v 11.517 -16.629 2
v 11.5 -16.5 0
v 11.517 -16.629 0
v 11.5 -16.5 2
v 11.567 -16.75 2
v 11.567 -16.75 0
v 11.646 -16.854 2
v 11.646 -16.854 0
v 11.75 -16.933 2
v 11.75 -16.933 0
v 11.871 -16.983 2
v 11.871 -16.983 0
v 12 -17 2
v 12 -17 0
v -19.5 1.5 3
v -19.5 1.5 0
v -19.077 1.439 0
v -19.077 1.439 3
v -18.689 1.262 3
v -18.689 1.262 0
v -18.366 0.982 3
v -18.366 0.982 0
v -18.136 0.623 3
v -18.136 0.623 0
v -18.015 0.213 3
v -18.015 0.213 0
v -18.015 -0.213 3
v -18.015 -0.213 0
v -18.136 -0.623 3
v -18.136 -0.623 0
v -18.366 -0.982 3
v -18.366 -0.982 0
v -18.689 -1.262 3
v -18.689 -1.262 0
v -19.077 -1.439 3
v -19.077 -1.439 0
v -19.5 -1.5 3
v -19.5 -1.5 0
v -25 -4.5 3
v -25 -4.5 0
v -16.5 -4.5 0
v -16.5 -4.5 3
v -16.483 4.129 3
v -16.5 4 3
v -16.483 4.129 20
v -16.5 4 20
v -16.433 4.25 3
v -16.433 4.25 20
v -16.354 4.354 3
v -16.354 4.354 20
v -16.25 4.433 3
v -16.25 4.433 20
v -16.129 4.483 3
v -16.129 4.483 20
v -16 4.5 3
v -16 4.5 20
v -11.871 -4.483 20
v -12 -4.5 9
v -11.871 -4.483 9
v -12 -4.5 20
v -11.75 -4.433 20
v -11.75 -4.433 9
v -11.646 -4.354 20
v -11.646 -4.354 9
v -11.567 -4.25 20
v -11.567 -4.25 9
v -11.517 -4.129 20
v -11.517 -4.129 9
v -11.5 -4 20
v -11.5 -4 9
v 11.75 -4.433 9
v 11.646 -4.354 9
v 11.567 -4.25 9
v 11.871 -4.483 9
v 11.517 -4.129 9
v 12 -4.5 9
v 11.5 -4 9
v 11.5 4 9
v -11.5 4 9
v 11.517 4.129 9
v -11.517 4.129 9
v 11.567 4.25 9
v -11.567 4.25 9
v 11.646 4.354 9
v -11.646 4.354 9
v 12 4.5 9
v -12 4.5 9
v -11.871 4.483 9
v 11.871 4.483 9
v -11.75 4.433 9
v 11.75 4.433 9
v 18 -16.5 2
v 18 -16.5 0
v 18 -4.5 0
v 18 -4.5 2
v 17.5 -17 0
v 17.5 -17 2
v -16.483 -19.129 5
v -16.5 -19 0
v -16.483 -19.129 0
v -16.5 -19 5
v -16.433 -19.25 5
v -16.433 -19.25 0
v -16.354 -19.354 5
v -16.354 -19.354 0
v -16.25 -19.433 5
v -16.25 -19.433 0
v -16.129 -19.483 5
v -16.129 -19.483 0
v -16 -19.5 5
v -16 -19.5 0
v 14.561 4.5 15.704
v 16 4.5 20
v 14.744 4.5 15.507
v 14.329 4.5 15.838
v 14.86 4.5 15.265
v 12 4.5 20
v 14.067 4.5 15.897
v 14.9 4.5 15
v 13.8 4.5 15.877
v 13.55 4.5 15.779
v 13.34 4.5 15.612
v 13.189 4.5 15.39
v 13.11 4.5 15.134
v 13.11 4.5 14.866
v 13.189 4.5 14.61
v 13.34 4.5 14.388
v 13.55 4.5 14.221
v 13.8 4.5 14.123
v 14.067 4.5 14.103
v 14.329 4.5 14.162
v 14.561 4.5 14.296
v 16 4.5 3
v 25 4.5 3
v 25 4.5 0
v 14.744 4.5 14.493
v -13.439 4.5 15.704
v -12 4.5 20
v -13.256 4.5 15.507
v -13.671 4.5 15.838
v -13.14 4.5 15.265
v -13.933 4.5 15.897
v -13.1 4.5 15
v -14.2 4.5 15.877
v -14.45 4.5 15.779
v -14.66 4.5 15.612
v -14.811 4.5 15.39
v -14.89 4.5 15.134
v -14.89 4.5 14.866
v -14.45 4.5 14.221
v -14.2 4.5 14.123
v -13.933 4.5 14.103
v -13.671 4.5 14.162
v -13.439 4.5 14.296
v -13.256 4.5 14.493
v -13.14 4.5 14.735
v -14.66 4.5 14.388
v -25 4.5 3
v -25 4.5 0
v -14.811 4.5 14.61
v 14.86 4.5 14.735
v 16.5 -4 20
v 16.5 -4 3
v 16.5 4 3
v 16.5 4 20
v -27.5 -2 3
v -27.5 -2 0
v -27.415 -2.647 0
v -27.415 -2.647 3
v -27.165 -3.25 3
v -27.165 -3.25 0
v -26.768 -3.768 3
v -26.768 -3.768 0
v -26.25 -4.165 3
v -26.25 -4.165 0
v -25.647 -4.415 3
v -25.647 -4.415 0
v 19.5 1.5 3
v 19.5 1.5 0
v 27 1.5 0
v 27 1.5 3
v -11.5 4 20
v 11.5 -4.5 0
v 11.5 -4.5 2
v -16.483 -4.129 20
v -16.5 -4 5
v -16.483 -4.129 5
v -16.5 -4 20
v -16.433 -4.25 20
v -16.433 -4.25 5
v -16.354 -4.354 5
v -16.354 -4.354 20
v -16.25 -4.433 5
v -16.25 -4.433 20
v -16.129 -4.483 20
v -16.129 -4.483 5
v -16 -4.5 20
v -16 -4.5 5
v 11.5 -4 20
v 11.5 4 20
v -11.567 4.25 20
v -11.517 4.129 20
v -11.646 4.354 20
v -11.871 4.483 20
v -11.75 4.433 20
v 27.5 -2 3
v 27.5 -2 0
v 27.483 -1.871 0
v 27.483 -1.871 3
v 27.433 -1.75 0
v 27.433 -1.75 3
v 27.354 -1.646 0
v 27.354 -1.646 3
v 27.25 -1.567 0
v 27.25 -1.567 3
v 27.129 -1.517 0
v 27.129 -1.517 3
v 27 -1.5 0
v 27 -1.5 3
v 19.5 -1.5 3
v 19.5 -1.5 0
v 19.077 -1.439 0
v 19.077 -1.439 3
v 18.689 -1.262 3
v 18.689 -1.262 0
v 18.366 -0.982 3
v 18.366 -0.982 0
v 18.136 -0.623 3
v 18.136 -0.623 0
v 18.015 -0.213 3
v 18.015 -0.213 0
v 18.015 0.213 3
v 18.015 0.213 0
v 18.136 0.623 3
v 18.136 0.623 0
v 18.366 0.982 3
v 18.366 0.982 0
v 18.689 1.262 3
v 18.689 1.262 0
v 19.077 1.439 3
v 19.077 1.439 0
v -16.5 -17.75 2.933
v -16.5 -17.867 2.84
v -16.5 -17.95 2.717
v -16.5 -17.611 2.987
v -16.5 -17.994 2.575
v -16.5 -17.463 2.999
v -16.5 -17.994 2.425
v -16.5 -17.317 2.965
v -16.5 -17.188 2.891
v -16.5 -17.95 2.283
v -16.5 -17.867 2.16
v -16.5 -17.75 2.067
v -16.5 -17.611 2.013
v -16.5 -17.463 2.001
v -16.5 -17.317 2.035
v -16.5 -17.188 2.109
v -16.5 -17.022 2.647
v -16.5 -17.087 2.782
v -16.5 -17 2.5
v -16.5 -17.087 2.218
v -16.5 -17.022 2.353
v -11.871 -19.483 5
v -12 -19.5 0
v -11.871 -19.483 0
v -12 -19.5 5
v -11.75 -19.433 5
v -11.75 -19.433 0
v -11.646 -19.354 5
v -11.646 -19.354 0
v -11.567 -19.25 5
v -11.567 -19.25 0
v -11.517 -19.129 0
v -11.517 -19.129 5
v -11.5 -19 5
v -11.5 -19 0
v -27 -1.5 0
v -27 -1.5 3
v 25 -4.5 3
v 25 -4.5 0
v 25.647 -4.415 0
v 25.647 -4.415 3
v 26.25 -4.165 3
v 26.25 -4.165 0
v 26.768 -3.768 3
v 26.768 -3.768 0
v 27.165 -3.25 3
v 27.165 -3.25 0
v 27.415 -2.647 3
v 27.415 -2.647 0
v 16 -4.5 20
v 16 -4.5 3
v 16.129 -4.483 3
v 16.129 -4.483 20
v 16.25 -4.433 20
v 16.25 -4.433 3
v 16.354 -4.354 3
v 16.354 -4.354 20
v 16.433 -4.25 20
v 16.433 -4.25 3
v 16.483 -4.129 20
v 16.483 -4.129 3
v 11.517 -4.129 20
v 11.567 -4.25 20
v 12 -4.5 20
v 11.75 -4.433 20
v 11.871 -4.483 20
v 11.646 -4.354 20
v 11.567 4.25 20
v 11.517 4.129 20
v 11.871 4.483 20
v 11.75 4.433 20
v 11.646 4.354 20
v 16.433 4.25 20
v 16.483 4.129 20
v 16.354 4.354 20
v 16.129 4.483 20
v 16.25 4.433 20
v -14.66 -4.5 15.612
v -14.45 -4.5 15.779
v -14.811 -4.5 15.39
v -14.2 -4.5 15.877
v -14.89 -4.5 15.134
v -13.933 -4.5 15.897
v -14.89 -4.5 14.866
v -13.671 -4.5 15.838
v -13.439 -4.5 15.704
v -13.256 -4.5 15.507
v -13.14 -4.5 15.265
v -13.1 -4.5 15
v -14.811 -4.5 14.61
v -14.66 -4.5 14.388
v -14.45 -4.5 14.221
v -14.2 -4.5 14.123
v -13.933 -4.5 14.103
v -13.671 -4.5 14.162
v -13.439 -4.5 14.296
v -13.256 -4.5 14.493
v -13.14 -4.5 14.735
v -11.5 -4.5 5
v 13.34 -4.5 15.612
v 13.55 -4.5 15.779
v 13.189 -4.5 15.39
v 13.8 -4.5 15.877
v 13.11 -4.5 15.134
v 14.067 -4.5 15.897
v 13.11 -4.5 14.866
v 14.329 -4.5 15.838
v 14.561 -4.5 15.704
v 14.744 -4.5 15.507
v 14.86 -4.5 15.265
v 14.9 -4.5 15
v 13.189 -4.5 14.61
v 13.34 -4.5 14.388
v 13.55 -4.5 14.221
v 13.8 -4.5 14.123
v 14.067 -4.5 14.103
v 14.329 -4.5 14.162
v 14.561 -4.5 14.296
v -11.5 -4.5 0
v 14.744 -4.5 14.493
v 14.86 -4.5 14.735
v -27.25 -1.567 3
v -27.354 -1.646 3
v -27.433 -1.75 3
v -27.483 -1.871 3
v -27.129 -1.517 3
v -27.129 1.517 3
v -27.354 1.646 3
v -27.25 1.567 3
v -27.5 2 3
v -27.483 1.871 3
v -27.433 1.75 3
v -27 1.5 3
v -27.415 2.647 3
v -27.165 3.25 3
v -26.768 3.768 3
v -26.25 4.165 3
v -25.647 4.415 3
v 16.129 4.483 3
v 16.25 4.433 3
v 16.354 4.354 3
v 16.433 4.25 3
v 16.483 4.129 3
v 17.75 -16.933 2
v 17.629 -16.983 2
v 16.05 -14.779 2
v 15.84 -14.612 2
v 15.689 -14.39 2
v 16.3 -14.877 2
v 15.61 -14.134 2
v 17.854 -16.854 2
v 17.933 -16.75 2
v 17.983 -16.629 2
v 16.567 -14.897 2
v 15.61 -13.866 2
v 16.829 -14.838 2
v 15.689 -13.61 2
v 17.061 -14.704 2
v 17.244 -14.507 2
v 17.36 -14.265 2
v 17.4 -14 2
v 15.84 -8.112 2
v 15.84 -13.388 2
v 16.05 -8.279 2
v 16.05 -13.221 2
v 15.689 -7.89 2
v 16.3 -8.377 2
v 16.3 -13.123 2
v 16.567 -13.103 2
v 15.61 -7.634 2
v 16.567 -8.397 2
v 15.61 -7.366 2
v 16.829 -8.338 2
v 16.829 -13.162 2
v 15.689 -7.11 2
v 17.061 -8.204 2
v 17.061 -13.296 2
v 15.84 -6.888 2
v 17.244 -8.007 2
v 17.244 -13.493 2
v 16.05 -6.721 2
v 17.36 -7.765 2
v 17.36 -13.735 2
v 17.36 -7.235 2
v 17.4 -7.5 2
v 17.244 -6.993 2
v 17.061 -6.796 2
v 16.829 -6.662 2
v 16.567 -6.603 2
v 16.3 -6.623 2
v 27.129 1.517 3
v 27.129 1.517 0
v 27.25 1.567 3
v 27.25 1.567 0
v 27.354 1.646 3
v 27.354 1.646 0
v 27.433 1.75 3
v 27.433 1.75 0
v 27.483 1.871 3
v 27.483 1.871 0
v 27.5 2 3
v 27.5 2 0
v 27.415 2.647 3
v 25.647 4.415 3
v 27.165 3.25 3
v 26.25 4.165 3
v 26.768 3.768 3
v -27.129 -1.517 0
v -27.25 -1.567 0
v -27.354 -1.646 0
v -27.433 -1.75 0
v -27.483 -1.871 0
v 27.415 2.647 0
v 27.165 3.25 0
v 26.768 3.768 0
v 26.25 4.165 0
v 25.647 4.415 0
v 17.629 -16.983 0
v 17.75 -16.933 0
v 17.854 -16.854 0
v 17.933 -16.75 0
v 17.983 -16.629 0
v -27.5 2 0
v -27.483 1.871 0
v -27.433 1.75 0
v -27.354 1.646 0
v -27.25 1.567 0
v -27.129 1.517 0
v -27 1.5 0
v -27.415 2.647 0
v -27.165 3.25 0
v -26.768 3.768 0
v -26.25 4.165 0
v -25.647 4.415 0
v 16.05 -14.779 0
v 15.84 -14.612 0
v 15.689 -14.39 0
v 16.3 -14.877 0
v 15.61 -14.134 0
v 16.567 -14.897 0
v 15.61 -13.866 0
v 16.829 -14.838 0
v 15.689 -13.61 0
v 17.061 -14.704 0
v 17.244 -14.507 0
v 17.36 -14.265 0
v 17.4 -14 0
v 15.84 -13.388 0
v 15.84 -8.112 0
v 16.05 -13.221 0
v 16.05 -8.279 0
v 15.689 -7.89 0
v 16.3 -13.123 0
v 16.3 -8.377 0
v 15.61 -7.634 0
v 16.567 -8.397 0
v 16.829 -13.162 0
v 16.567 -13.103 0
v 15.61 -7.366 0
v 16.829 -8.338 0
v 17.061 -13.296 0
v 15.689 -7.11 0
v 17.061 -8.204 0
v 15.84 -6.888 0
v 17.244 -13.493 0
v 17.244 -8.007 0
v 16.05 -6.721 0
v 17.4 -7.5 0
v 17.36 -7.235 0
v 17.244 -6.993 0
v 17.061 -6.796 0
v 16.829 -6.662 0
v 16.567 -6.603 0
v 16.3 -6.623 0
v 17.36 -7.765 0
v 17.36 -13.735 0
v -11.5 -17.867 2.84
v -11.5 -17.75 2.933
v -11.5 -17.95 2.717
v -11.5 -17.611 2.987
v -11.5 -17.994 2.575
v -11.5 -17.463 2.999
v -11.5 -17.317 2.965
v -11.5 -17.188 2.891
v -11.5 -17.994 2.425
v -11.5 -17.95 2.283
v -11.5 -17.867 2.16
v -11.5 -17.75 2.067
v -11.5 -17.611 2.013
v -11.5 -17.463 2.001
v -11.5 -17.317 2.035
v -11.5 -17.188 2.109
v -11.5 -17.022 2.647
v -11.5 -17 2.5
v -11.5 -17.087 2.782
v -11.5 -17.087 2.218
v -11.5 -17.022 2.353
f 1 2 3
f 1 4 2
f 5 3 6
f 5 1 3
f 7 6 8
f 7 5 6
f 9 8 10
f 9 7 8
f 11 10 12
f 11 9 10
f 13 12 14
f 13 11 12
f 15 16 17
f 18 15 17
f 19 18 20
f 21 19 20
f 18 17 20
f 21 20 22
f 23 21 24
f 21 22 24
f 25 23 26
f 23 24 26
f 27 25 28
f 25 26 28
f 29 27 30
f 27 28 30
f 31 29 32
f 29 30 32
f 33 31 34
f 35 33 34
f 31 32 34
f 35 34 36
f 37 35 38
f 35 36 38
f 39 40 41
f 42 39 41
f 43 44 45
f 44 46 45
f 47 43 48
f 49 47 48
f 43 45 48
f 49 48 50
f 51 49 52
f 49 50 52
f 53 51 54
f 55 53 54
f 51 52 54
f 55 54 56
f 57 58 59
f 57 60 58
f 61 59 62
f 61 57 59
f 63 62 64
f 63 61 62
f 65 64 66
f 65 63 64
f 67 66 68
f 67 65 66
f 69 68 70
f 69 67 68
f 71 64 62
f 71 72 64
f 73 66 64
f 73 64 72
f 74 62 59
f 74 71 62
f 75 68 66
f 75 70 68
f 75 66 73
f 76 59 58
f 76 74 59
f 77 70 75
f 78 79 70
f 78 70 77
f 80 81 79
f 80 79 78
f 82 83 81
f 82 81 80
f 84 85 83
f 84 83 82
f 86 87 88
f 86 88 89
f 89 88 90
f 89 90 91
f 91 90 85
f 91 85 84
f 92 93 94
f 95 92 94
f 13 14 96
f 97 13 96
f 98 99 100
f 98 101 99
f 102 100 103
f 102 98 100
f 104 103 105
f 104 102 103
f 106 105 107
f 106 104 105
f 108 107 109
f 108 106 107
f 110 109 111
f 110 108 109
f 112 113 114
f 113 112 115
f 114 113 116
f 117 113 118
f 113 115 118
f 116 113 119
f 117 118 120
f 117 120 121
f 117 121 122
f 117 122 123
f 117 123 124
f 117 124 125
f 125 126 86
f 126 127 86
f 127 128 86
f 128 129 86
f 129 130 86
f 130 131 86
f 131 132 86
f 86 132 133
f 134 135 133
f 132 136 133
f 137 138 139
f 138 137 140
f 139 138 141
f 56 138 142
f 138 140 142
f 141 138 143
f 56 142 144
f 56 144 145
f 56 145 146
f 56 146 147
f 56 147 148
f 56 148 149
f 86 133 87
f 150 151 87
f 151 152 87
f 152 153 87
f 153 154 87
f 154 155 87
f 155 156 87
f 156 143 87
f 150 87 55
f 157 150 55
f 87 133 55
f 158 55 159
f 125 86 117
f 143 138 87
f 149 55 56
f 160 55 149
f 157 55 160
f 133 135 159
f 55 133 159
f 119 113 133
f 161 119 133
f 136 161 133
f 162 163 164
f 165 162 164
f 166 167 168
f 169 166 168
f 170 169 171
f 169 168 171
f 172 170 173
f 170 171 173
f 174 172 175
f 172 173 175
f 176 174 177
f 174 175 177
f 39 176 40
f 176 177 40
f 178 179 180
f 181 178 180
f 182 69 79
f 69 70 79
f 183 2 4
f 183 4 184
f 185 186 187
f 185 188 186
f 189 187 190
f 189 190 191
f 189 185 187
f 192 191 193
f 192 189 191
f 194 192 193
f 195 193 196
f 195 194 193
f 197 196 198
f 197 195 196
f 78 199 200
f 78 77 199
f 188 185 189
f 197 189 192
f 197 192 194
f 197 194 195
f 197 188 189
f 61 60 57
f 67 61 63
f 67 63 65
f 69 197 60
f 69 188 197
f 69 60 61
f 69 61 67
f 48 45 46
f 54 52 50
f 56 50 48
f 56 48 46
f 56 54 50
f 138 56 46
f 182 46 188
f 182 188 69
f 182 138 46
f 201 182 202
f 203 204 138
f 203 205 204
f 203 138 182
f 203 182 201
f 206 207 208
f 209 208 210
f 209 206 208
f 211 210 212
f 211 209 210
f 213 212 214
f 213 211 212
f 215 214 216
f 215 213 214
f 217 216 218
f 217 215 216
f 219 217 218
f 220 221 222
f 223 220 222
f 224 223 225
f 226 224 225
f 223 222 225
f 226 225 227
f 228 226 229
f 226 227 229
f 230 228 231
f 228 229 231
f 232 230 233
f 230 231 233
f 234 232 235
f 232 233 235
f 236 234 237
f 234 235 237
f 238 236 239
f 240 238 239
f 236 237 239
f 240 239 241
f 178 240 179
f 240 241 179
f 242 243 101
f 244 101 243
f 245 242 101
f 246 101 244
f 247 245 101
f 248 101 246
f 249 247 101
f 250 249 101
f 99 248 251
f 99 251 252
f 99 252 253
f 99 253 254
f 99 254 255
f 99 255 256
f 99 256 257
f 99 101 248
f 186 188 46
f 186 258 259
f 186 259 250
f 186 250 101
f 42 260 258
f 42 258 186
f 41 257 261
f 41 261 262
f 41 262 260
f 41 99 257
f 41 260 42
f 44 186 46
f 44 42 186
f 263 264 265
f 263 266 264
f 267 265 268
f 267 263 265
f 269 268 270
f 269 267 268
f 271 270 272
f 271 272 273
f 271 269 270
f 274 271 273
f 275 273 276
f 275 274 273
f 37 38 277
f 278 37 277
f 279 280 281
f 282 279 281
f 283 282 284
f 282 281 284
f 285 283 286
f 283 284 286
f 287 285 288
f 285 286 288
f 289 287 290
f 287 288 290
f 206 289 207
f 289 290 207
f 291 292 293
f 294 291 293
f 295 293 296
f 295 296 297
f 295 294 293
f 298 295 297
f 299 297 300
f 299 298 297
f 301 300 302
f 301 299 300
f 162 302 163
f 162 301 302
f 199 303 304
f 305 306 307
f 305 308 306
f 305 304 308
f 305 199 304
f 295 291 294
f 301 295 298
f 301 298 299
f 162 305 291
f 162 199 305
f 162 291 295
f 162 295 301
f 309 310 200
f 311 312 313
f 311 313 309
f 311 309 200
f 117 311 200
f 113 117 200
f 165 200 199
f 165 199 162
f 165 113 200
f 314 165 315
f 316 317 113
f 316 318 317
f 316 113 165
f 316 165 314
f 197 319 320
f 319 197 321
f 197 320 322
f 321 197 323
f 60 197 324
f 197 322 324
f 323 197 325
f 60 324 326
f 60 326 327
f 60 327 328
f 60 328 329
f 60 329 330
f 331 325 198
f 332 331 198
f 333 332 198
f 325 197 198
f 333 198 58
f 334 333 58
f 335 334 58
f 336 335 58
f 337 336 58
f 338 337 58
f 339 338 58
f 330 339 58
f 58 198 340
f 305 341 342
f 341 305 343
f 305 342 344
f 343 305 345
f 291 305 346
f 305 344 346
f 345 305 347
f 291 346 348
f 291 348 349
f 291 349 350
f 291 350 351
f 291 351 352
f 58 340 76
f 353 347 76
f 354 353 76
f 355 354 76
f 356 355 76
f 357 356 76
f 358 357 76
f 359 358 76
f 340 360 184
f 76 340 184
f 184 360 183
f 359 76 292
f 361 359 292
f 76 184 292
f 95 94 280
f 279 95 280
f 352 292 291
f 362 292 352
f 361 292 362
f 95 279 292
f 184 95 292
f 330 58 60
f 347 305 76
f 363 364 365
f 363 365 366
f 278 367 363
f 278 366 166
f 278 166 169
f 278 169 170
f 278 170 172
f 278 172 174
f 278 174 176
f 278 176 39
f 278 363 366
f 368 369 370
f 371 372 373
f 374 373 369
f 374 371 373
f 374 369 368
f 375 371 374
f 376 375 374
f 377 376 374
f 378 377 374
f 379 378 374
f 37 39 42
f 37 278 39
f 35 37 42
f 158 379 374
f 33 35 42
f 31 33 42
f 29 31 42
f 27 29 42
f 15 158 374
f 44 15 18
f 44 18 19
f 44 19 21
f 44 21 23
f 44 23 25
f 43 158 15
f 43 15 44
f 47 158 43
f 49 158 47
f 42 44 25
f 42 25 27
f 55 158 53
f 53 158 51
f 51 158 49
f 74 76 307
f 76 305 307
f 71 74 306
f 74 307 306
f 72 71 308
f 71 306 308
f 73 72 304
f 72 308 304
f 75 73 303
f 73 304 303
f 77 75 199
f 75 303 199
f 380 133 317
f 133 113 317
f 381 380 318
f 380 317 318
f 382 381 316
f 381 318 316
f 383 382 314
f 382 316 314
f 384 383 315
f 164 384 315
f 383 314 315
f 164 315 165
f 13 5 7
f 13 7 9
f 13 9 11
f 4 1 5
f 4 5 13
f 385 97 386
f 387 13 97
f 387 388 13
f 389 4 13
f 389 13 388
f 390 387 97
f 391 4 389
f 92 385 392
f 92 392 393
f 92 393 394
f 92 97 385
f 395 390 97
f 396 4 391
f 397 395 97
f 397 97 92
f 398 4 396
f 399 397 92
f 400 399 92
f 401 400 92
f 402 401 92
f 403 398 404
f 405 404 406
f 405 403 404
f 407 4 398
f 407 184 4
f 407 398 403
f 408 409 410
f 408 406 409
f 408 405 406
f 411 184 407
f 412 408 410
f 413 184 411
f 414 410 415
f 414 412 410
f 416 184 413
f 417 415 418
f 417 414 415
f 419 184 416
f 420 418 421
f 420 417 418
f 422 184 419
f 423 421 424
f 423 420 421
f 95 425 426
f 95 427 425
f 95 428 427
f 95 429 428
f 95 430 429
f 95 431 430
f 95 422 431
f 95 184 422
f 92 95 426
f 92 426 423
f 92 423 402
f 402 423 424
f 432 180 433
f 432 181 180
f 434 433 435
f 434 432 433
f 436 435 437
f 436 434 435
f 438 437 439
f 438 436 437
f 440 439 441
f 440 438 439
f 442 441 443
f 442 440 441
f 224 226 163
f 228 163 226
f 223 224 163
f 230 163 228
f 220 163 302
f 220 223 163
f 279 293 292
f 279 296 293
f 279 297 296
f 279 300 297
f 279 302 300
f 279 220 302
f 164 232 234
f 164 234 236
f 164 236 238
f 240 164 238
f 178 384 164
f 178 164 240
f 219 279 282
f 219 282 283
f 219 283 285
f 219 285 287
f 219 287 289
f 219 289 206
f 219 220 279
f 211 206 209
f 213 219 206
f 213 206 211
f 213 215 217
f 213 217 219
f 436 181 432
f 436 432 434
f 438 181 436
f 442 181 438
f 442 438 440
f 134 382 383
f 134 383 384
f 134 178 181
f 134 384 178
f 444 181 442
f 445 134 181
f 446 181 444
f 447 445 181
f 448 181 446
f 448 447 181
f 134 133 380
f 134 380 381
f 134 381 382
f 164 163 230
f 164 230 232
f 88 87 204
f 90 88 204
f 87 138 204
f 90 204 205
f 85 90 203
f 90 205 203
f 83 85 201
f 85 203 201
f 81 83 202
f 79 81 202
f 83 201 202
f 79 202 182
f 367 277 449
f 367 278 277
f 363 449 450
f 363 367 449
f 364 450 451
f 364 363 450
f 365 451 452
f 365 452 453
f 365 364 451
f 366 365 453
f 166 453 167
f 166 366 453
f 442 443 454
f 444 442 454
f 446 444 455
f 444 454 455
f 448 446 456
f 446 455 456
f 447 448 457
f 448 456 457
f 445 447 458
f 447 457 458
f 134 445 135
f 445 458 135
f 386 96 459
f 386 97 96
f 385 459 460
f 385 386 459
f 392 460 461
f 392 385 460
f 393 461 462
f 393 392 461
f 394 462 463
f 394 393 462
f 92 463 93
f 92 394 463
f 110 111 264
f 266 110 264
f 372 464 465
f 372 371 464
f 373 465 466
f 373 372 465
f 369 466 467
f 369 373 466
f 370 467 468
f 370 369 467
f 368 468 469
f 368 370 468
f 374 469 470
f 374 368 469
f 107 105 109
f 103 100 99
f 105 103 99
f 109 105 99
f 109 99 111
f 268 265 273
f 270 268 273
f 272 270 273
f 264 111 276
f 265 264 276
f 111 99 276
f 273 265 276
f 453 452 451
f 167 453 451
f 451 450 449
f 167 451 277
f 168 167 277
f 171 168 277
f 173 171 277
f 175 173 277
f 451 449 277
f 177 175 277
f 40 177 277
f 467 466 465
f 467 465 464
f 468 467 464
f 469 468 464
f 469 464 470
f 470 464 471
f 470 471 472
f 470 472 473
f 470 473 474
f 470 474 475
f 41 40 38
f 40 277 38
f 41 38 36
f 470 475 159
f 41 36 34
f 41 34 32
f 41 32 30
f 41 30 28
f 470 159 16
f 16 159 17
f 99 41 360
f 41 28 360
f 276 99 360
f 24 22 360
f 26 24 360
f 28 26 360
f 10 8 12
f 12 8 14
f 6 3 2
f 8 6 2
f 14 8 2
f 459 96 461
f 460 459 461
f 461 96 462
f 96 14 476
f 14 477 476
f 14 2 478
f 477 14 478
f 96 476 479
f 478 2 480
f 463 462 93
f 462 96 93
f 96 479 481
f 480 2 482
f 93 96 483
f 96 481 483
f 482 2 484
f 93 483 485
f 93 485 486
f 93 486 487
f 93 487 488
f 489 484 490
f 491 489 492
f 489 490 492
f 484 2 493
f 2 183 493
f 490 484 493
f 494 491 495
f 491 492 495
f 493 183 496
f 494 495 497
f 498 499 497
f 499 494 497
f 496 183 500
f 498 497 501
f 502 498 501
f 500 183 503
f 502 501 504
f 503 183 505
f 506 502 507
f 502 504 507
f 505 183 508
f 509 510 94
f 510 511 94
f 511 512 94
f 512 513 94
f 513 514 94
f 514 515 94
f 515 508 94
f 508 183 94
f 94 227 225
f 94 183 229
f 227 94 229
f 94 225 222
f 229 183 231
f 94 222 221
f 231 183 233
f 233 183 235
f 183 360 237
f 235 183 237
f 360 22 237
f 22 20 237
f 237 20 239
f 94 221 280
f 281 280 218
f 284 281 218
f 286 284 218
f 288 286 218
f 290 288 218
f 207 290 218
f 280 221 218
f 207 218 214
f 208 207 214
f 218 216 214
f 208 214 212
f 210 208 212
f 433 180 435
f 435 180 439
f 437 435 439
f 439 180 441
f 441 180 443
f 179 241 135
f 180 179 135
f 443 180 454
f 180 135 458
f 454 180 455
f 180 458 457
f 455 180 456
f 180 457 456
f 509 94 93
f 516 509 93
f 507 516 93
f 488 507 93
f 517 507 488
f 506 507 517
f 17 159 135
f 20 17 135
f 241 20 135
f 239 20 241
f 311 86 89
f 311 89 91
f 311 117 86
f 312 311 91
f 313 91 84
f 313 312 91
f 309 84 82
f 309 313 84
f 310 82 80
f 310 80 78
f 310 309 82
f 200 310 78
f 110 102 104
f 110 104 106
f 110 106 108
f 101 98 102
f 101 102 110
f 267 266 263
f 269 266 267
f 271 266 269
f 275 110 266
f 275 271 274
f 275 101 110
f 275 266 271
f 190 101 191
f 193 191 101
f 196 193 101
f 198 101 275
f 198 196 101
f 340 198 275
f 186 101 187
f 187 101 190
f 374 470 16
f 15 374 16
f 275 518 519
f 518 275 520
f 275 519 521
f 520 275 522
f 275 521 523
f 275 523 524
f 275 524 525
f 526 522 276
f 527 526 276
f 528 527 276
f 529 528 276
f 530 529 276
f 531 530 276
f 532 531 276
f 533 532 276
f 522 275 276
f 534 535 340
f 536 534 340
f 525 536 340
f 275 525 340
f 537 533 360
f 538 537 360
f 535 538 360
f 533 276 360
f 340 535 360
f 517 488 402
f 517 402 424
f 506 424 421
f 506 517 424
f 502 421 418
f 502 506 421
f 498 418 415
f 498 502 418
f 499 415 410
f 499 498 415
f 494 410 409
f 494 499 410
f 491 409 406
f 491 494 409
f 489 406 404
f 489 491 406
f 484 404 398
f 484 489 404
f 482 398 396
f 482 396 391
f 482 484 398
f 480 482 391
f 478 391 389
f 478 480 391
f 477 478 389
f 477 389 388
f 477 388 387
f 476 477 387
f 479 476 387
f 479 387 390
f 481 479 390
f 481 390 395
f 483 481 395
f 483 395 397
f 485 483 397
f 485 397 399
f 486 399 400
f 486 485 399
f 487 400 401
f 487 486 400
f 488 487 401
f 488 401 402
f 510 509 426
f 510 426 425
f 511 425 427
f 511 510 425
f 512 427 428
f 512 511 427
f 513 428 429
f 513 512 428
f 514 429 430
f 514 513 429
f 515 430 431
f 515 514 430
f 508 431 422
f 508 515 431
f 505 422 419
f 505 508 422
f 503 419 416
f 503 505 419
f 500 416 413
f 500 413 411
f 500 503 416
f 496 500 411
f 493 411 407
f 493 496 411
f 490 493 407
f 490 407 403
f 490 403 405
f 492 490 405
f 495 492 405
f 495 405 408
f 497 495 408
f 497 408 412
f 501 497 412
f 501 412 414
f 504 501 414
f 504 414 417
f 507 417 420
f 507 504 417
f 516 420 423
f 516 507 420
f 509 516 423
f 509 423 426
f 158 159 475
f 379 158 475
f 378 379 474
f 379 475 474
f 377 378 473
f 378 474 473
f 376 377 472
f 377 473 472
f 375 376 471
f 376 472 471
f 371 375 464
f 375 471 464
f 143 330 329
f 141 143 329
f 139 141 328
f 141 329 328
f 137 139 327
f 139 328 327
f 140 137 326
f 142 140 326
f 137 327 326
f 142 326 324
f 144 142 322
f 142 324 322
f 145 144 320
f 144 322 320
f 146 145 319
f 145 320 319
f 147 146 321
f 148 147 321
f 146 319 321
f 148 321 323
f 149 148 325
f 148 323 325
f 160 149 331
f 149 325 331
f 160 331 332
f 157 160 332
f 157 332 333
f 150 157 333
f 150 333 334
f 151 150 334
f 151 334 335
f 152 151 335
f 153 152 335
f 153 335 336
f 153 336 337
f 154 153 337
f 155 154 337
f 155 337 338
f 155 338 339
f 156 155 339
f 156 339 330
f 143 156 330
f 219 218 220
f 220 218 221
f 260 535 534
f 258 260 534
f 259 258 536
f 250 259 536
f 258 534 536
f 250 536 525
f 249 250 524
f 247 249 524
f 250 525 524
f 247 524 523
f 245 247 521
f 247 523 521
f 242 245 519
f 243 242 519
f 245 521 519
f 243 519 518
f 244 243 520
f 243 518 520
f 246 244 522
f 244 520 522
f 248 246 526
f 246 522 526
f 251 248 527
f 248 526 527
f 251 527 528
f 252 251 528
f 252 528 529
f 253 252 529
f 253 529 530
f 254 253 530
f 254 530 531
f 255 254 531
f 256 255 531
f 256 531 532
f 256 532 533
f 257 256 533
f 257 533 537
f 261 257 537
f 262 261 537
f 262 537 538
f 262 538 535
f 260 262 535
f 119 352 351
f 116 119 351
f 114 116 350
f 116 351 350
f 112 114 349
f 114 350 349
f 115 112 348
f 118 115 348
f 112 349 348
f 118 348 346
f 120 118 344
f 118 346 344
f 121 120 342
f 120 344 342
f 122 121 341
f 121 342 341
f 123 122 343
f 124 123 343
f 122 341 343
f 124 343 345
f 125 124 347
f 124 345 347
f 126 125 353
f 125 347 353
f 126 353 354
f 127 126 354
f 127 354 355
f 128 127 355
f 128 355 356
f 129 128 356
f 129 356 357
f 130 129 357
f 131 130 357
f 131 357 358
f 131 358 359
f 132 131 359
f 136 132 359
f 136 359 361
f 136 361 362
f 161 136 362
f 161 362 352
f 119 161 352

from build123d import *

# Parameters (mm, degrees)
F0_W      = 5
F0_H      = 9
F0_W_2    = 23
F1_DEPTH  = 3
F2_DEPTH  = 20
F3_DEPTH  = 9
F0_H_2    = 15
F4_DEPTH  = 5
F5_R      = 0.5
F6_DEPTH  = 25
F7_W      = 6.5
F7_H      = 12.5
F7_R      = 0.9
F8_DEPTH  = 2
F9_R      = 0.9
F10_DEPTH = 25
F11_R     = 0.49999


# Not quite as in the source:
# - a fillet or chamfer is up to 0.001 mm smaller than in the source, because OpenCascade refuses the exact size


with BuildPart() as f1:
    # F0 (on Top) → F1 (new body)
    with BuildSketch(Plane.XY):
        with BuildLine():
            Line((-16.5, 4.5), (-25, 4.5))
            ThreePointArc((-25, 4.5), (-26.767766953, 3.767766953), (-27.5, 2))
            Line((-27.5, 2), (-27.5, 1.5))
            Line((-27.5, 1.5), (-19.5, 1.5))
            ThreePointArc((-19.5, 1.5), (-18, 0), (-19.5, -1.5))
            Line((-19.5, -1.5), (-27.5, -1.5))
            Line((-27.5, -1.5), (-27.5, -2))
            ThreePointArc((-27.5, -2), (-26.767766953, -3.767766953), (-25, -4.5))
            Line((-25, -4.5), (-16.5, -4.5))
            Line((-16.5, -4.5), (-16.5, 4.5))
        make_face()
        with BuildLine():
            Line((25, 4.5), (16.5, 4.5))
            Line((16.5, 4.5), (16.5, -4.5))
            Line((16.5, -4.5), (25, -4.5))
            ThreePointArc((25, -4.5), (26.767766953, -3.767766953), (27.5, -2))
            Line((27.5, -2), (27.5, -1.5))
            Line((27.5, -1.5), (19.5, -1.5))
            ThreePointArc((19.5, -1.5), (18, 0), (19.5, 1.5))
            Line((19.5, 1.5), (27.5, 1.5))
            Line((27.5, 1.5), (27.5, 2))
            ThreePointArc((27.5, 2), (26.767766953, 3.767766953), (25, 4.5))
        make_face()
        with Locations((-14, 0)):
            Rectangle(F0_W, F0_H)
        with Locations((14, 0)):
            Rectangle(F0_W, F0_H)
        Rectangle(F0_W_2, F0_H)
    extrude(amount=F1_DEPTH)

    # F0 (on Top) → F2 (join)
    with BuildSketch(Plane.XY):
        with Locations((14, 0)):
            Rectangle(F0_W, F0_H)
        with Locations((-14, 0)):
            Rectangle(F0_W, F0_H)
    extrude(amount=F2_DEPTH)

    # F0 (on Top) → F3 (join)
    with BuildSketch(Plane.XY):
        Rectangle(F0_W_2, F0_H)
    extrude(amount=F3_DEPTH)

    # F0 (on Top) → F4 (join)
    with BuildSketch(Plane.XY):
        with Locations((-14, -12)):
            Rectangle(F0_W, F0_H_2)
    extrude(amount=F4_DEPTH)

    # F5 (on face) → F6 (cut)
    with BuildSketch(Plane.YZ.offset(-11.5)):
        with Locations((-17.5, 2.5)):
            Circle(F5_R)
    extrude(amount=-F6_DEPTH, mode=Mode.SUBTRACT)

    # F7 (on Top) → F8 (join)
    with BuildSketch(Plane.XY):
        with Locations((14.75, -10.75)):
            Rectangle(F7_W, F7_H)
        with Locations((16.5, -14)):
            Circle(F7_R, mode=Mode.SUBTRACT)
        with Locations((16.5, -7.5)):
            Circle(F7_R, mode=Mode.SUBTRACT)
    extrude(amount=F8_DEPTH)

    # F9 (on face) → F10 (cut)
    with BuildSketch(Plane.XZ.offset(4.5)):
        with Locations((-14, 15)):
            Circle(F9_R)
        with Locations((14, 15)):
            Circle(F9_R)
    extrude(amount=-F10_DEPTH, mode=Mode.SUBTRACT)

    # F11 (radius 0.5 in the source; OpenCascade refuses exactly that, so slightly less here)
    f11_edges = [f1.edges().sort_by_distance(p)[0] for p in [
        (11.5, -17, 1),
        (18, -17, 1),
        (-11.5, -19.5, 2.5),
        (-16.5, -19.5, 2.5),
        (-16.5, -4.5, 12.5),
        (11.5, -4.5, 14.5),
        (-11.5, -4.5, 14.5),
        (16.5, -4.5, 11.5),
        (11.5, 4.5, 14.5),
        (-11.5, 4.5, 14.5),
        (-16.5, 4.5, 11.5),
        (16.5, 4.5, 11.5),
        (-27.5, 1.5, 1.5),
        (-27.5, -1.5, 1.5),
        (27.5, 1.5, 1.5),
        (27.5, -1.5, 1.5),
    ]]
    fillet(f11_edges, radius=F11_R)


solid = f1.part
